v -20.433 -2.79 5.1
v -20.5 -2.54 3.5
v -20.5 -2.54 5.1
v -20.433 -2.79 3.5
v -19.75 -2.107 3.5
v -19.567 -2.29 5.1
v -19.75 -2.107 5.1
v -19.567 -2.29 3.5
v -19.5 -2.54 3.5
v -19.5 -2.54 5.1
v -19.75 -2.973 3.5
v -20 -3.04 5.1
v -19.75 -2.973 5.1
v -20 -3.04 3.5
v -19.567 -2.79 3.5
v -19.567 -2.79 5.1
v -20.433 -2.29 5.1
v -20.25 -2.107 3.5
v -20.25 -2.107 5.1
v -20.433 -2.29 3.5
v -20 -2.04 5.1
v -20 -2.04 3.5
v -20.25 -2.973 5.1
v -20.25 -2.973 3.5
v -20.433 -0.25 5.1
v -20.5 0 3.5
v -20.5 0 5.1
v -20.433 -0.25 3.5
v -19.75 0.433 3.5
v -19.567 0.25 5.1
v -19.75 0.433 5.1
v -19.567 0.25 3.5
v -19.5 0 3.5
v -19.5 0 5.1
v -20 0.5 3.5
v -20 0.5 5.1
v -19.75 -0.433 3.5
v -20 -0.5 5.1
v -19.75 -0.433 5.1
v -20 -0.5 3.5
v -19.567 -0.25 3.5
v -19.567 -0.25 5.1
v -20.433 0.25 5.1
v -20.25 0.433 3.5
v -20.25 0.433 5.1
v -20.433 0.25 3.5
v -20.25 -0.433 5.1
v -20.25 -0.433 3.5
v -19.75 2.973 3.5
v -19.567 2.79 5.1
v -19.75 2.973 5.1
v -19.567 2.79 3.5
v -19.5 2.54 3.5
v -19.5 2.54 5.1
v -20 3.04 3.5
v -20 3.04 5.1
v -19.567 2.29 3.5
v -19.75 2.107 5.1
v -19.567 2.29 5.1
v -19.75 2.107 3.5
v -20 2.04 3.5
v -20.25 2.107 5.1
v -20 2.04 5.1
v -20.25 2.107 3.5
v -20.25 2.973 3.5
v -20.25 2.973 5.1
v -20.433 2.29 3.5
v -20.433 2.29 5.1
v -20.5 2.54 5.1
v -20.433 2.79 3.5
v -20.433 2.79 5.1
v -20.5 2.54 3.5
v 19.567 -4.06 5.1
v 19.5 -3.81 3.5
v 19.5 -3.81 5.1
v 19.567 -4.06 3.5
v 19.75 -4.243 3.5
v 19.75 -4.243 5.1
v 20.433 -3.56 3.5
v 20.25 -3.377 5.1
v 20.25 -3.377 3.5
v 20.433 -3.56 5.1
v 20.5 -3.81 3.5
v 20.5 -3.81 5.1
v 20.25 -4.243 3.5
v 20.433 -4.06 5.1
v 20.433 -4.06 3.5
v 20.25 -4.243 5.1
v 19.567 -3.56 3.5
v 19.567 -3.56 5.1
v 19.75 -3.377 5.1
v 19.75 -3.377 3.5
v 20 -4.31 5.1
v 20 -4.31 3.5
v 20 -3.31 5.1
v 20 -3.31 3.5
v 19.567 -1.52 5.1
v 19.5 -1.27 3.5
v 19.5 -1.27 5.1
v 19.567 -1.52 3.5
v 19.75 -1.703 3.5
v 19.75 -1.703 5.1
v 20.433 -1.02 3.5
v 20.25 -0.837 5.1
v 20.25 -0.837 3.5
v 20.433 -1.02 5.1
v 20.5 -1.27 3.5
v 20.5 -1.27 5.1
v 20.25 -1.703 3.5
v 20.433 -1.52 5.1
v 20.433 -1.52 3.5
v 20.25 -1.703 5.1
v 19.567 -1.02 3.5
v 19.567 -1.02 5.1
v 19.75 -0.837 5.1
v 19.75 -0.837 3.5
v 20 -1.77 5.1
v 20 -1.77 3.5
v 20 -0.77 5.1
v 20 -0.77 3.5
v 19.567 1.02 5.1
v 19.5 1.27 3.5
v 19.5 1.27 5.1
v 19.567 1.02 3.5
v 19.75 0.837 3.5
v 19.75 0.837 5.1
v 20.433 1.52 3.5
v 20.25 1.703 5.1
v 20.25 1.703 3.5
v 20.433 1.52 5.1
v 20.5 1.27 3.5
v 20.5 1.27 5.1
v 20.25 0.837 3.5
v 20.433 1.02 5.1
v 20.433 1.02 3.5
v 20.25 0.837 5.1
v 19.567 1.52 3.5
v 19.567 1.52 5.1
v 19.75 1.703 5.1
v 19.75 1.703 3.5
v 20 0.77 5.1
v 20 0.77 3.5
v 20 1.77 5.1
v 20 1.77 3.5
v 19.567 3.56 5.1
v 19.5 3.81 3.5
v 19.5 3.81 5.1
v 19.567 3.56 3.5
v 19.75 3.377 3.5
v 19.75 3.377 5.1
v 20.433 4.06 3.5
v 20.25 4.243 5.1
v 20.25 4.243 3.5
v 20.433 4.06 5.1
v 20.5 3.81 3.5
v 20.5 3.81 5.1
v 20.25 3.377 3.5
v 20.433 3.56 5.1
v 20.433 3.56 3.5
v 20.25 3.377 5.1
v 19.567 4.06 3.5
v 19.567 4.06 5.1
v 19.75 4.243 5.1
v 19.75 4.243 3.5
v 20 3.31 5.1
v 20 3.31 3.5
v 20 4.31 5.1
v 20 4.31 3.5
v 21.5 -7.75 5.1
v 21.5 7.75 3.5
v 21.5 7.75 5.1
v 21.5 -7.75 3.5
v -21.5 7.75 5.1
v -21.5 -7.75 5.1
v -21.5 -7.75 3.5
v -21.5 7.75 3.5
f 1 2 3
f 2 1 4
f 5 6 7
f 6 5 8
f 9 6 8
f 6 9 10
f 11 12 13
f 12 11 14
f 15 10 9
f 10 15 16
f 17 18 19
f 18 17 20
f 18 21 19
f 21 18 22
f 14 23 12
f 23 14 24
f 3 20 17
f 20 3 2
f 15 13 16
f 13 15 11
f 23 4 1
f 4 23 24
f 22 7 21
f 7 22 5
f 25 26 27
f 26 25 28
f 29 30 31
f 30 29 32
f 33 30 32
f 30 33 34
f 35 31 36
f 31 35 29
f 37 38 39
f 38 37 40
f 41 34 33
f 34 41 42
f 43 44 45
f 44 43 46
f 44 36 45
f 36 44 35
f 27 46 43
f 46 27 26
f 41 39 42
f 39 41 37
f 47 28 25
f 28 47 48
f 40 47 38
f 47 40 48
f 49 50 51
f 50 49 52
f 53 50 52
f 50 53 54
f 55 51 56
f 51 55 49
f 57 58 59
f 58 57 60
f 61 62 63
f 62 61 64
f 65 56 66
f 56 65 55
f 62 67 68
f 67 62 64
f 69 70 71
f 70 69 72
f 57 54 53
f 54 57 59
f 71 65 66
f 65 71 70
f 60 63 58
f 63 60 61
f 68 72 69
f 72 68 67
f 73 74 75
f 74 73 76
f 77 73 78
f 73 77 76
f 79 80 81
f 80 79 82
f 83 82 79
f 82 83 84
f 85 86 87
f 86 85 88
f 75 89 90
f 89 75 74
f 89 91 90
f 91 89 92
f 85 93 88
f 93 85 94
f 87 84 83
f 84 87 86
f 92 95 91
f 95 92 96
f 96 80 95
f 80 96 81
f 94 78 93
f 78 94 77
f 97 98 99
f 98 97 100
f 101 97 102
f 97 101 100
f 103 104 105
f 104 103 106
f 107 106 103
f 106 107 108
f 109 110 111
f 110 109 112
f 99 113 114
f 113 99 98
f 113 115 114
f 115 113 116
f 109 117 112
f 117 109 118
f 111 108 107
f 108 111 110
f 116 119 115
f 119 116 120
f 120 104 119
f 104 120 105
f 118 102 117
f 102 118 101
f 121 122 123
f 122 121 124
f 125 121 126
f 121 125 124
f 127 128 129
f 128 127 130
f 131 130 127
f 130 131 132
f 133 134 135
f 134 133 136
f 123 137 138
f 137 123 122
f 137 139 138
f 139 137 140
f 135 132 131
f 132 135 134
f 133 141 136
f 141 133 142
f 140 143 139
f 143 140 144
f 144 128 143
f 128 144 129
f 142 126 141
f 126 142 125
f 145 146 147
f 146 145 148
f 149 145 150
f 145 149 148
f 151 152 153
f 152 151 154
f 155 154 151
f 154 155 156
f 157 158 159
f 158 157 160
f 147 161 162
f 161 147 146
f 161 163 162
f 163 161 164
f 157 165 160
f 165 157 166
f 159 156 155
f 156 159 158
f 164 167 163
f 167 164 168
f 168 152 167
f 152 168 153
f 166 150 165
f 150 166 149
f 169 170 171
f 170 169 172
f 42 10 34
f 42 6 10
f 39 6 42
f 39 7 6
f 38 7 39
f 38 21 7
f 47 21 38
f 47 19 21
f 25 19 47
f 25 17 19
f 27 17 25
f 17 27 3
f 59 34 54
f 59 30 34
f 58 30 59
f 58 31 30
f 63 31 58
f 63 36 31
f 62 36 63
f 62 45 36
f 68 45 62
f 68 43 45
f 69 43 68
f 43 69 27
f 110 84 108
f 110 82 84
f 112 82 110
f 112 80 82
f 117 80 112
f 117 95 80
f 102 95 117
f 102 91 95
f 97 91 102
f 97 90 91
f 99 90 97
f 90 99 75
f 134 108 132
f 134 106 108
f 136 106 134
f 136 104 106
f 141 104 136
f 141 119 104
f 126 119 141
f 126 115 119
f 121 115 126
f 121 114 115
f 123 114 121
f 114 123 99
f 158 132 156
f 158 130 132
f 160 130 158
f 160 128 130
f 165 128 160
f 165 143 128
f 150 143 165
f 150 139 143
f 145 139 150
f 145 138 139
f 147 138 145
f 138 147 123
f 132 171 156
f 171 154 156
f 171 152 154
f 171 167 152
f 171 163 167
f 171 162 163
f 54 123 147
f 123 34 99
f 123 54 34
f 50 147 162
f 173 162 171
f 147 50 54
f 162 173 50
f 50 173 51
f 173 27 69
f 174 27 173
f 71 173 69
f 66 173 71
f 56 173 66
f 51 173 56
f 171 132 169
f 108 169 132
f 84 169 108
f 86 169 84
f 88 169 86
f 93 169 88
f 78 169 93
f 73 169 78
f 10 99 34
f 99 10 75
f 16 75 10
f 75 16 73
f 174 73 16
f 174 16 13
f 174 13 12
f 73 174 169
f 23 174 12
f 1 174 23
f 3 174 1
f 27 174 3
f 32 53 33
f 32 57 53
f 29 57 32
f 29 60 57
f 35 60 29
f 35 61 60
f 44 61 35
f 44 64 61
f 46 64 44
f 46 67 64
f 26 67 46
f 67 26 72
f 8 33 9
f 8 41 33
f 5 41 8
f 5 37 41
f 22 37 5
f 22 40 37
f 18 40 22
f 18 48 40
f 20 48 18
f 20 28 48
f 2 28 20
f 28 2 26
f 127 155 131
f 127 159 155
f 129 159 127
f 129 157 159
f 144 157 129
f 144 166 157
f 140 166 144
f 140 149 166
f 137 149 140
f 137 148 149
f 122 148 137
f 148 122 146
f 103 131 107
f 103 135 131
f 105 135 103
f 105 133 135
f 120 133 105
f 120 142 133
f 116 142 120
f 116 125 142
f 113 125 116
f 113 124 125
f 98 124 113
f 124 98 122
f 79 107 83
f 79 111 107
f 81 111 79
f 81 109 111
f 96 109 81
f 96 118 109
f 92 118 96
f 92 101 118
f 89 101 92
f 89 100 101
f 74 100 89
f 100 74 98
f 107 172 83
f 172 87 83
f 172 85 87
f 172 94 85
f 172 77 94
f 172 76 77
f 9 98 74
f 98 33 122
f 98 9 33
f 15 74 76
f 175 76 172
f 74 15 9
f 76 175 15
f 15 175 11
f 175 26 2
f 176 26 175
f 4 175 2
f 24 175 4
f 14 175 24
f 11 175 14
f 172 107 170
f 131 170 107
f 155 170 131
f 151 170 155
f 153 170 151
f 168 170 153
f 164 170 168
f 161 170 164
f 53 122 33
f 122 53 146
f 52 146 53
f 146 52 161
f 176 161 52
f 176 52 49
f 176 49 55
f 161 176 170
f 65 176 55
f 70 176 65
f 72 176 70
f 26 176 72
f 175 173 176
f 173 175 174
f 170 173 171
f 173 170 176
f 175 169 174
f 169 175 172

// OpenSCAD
// file: ../../screw-post/screw-post.scad
//-----------------------------------------------------------------------
// Screw post: a round post off the floor that a board screws down onto
//
// Two ways to fix:
//   "nut"  clearance hole through the post and floor; the nut sits in a hex
//          trap in the floor's underside, so the screw goes in from the top
//   "tap"  a pilot hole the screw cuts its own thread in (one or two fittings
//          in PLA/PETG); blind, the floor stays whole underneath
// and "head" for a screw up from below (head in a counterbore, nut on top).
//
// Modules, all in the same frame:
//   screwPostGhost()     the screw (and nut), for previews
//   screwPost()          the post: add to the floor
//   screwPostFloorCut()  subtract from the floor: nut trap / counterbore and hole
//
// Frame: origin on the floor top, on the post's axis. Z up; the floor is
// Z = -floorThick .. 0. Units: mm.
//
// Sizes: "M2", "M2.5", "M3". screwPostScrew(size, ...) says which screw length
// reaches, so a project can assert it has that screw in the kit.
//-----------------------------------------------------------------------

//-- [name, screw Ø, nut across flats, nut thick, head Ø, head height, tap hole, post Ø]
//-- Nuts ISO 4032; heads ISO 7380 button. Tap holes: the usual ~0.8 x Ø for plastic
screwSizes = [
  ["M2",   2.0, 4.0, 1.6, 3.5, 1.1, 1.6, 5.0],
  ["M2.5", 2.5, 5.0, 2.0, 4.4, 1.4, 2.1, 6.0],    // head 4.4: measured on the kit's M2.5 (controller base)
  ["M3",   3.0, 5.5, 2.4, 5.7, 1.65, 2.5, 7.0],
];

screwHoleClear = 0.4;     // added to the screw Ø for a clearance hole
screwNutClear  = 0.3;     // CAL: across flats, nut trap over the nut. Set by the fit piece
screwTapClear  = 0.0;     // CAL: added to the tap hole. Set by the fit piece
screwHeadClear = 0.6;     // counterbore over the head Ø

function screwSize(size) = let (i = search([size], screwSizes)[0])
  assert(i != [] && i != undef, str("unknown screw size ", size)) screwSizes[i];
function screwDia(size)    = screwSize(size)[1];
function screwNutAF(size)  = screwSize(size)[2];
function screwNutH(size)   = screwSize(size)[3];
function screwHeadDia(size)= screwSize(size)[4];
function screwHeadH(size)  = screwSize(size)[5];
function screwPostDia(size)= screwSize(size)[7];

//-- Shortest screw that fills the nut, from the top of the clamped part (h + clamp
//-- above the floor) down to the nut trap's underside. Round up to a length you have.
function screwPostScrew(size, h, floorThick, clamp = 1.6) = h + clamp + floorThick;

module screwPostGhost(size, h, floorThick, clamp = 1.6, length, how = "nut")
{
  d = screwDia(size);
  L = is_undef(length) ? screwPostScrew(size, h, floorThick, clamp) : length;
  top = h + clamp;
  if (how == "head")
  {
    %color("Silver") translate([0, 0, -floorThick]) cylinder(d = screwHeadDia(size), h = screwHeadH(size), $fn = 24);
    %color("Silver") translate([0, 0, -floorThick + screwHeadH(size)]) cylinder(d = d, h = L, $fn = 16);
  }
  else
  {
    %color("Silver") translate([0, 0, top]) cylinder(d = screwHeadDia(size), h = screwHeadH(size), $fn = 24);
    %color("Silver") translate([0, 0, top - L]) cylinder(d = d, h = L, $fn = 16);
    if (how == "nut")
      %color("DimGray") translate([0, 0, -floorThick]) rotate([0, 0, 30]) cylinder(d = screwNutAF(size)/cos(30), h = screwNutH(size), $fn = 6);
  }
}

//-- how: "nut" | "head" (through hole) or "tap" (blind pilot hole). postDia defaults by size
module screwPost(size, h, how = "nut", postDia, tapClear = screwTapClear)
{
  pd = is_undef(postDia) ? screwPostDia(size) : postDia;
  hole = how == "tap" ? screwSize(size)[6] + tapClear : screwDia(size) + screwHoleClear;
  difference()
  {
    translate([0, 0, -0.01]) cylinder(d = pd, h = h + 0.01, $fn = 40);
    translate([0, 0, how == "tap" ? 0.6 : -1]) cylinder(d = hole, h = h + 2, $fn = 24);
    //-- lead-in so the screw starts square
    translate([0, 0, h - 0.4]) cylinder(d1 = hole, d2 = hole + 0.8, h = 0.41, $fn = 24);
  }
}

//-- "nut": hex trap from the underside, opening a little over the nut so it sits flush.
//-- "head": counterbore for the head. "tap": nothing.
module screwPostFloorCut(size, floorThick, how = "nut", nutClear = screwNutClear)
{
  d = screwDia(size) + screwHoleClear;
  if (how == "nut")
  {
    af = screwNutAF(size) + nutClear;
    translate([0, 0, -floorThick - 1]) rotate([0, 0, 30]) cylinder(d = af/cos(30), h = screwNutH(size) + 0.1 + 1, $fn = 6);
    translate([0, 0, -floorThick - 1]) cylinder(d = d + 0.4, h = floorThick + 2, $fn = 24);
  }
  if (how == "head")
  {
    translate([0, 0, -floorThick - 1]) cylinder(d = screwHeadDia(size) + screwHeadClear, h = screwHeadH(size) + 0.2 + 1, $fn = 32);
    translate([0, 0, -floorThick - 1]) cylinder(d = d + 0.4, h = floorThick + 2, $fn = 24);
  }
  assert(how == "tap" || floorThick >= (how == "nut" ? screwNutH(size) : screwHeadH(size)) + 0.1 + 0.3,
         str("floor too thin for the ", size, " ", how));
}
// file: ../../board-pocket/board-pocket.scad
//-----------------------------------------------------------------------
// Board pocket: holds a board that has no mounting holes
//
// The board sits on a central pedestal with a pad of double-sided foam tape
// on top, inside a low wall that follows its outline. The pedestal keeps
// the board's edges off the floor, so lead stubs soldered through the edge
// holes have room underneath; gaps in the wall let the leads out. The wall
// only locates the board: the tape holds it down, and in a closed box a lid
// pad presses a pad of foam onto it (boardLidPad below).
//
// Modules, all in the same frame:
//   boardPocketGhost()   the board and its tape, for previews
//   boardPocketHolder()  the plastic: pedestal and outline wall, add to the floor
//   boardLidPad()        a block hanging from the lid that presses foam onto the board
//   boardLidPadGhost()   the foam under it, squashed, for previews
//
// Frame: origin on the floor top, under the centre of the board's outline.
// X along the board's length l, Y across its width w, Z up. Units: mm.
//
// Sides are listed [-X, +X, -Y, +Y], each one of
//   "gap"    wall with a gap in the middle for leads (gapW wide)
//   "solid"  whole wall: use it where the board takes a push (a plug)
//   "open"   no wall: the board's edge goes into a box wall (a USB port)
//
// Used by esp32-c3-supermini, esp32-s3-devkitc and rs485-max485.
//-----------------------------------------------------------------------

//-- From the controller project's receiver.scad / rack-end.scad (boardPocket), 2026-10-30
bpPedestal  = 2.5;     // floor to the tape: room for lead stubs under the board edges
bpTape      = 1.0;     // double-sided foam tape on the pedestal. CAL: how far it squashes
bpWall      = 1.2;     // outline wall thickness
bpRise      = 1.0;     // wall top above the PCB underside (the controller project's rack-end: 0.8 under the S3's module)
bpClearance = 0.4;     // per side, board outline to wall: PETG. 0.3 for PLA. Set by the fit piece
bpGapW      = 6;       // lead gap in a "gap" side
bpPadInset  = 4;       // default pedestal: the board less this all round

//-- Lid hold-down (the controller project's receiver / rack-end lid pads)
bpFoam      = 3.0;     // CAL: self-adhesive foam stuck under each lid pad
bpSqueeze   = 1.0;     // how far the lid squashes it: ~1/3 for soft foam, 0.3 for felt

//-- PCB underside above the floor top
function boardPocketZ(pedestal = bpPedestal, tape = bpTape) = pedestal + tape;
//-- default pedestal [l, w] for a board
function boardPocketPad(l, w, inset = bpPadInset) = [max(l - 2*inset, 4), max(w - 2*inset, 4)];
//-- Z of a lid pad's underside, pressing on a surface at surfaceZ (board top, or a part on it)
function boardLidPadZ(surfaceZ, foam = bpFoam, squeeze = bpSqueeze) =
  assert(squeeze > 0 && squeeze < foam, "foam would not touch the board")
  surfaceZ + foam - squeeze;

function bpSides4(s) = is_list(s) ? s : [s, s, s, s];

module boardPocketGhost(l, w, pcb = 1.6, pad, pedestal = bpPedestal, tape = bpTape)
{
  p = is_undef(pad) ? boardPocketPad(l, w) : pad;
  %color("White") translate([-p[0]/2, -p[1]/2, pedestal]) cube([p[0], p[1], tape]);
  %color("DarkGreen") translate([-l/2, -w/2, pedestal + tape]) cube([l, w, pcb]);
}

//-- pad: pedestal [l, w]; gapW a number or one per side
module boardPocketHolder(l, w, pad, sides = "gap", gapW = bpGapW, clearance = bpClearance,
                         pedestal = bpPedestal, tape = bpTape, wall = bpWall, rise = bpRise)
{
  p   = is_undef(pad) ? boardPocketPad(l, w) : pad;
  s   = bpSides4(sides);
  g   = bpSides4(gapW);
  ix  = l/2 + clearance;                 // inner half sizes
  iy  = w/2 + clearance;
  top = pedestal + tape + rise;
  assert(p[0] <= l && p[1] <= w, "pedestal bigger than the board");
  for (k = s) assert(k == "gap" || k == "solid" || k == "open", str("unknown side ", k));

  //-- pedestal, centred under the board
  translate([-p[0]/2, -p[1]/2, -0.01]) cube([p[0], p[1], pedestal + 0.01]);
  //-- outline wall
  difference()
  {
    translate([-ix - wall, -iy - wall, -0.01]) cube([2*(ix + wall), 2*(iy + wall), top + 0.01]);
    translate([-ix, -iy, -1]) cube([2*ix, 2*iy, top + 2]);
    for (i = [0 : 3])
    {
      //-- each side's cut, drawn for -X then turned into place
      ax = (i < 2) ? ix : iy;         // inner half size across the side
      al = (i < 2) ? iy : ix;         // half length along it
      rotate([0, 0, [0, 180, 90, 270][i]])   // -X, +X, -Y, +Y
      {
        if (s[i] == "gap")
          translate([-ax - wall - 1, -g[i]/2, -1]) cube([wall + 2, g[i], top + 2]);
        if (s[i] == "open")
          translate([-ax - wall - 1, -al - wall - 1, -1]) cube([wall + 1.01, 2*(al + wall + 1), top + 2]);
      }
    }
  }
}

//-- A lid pad over the rectangle size [x, y] centred at `at`, from the squashed foam up to
//-- lidZ (the lid's inner face in this frame), running `into` up into the lid plate
module boardLidPad(size, at = [0, 0], surfaceZ, lidZ, foam = bpFoam, squeeze = bpSqueeze, into = 0.5)
{
  z0 = boardLidPadZ(surfaceZ, foam, squeeze);
  assert(lidZ > z0, "lid is below the pad: the box is too low for the foam");
  translate([at[0] - size[0]/2, at[1] - size[1]/2, z0]) cube([size[0], size[1], lidZ - z0 + into]);
}

module boardLidPadGhost(size, at = [0, 0], surfaceZ, foam = bpFoam, squeeze = bpSqueeze)
{
  %color("Gray") translate([at[0] - size[0]/2, at[1] - size[1]/2, surfaceZ]) cube([size[0], size[1], foam - squeeze]);
}
// main file
// The board as solids, for the catalogue (the Ghost is % so it never renders).
// part = "board" | "chips" | "foam" (squashed, under the lid pads); n boards at the fit piece's pitch.
// tape = 0 seats it as on a carrier (no tape under the board).
include <../rs485-max485.scad>

variant = "jzk";
part    = "board";
n       = 1;
pitch   = 30;
squeezes = [0.5, 1.0, 1.5, 2.0];   // as fit.scad (n > 1)
tape    = bpTape;

v   = rs485(variant);
top = rs485Top(variant, bpPedestal, tape);
module one(sq)
{
  if (part == "board") difference()
  {
    translate([-v[1]/2, -v[2]/2, top - v[3]]) cube([v[1], v[2], v[3]]);
    for (e = [[-1, v[5]], [1, v[6]]], i = [0 : e[1] - 1])
      translate([e[0]*(v[1]/2 - rs485PinEnd), (i - (e[1] - 1)/2)*rs485PinPitch, top - v[3] - 1])
        cylinder(d = 1.0, h = v[3] + 2, $fn = 12);
  }
  if (part == "chips")
  {
    for (x = [-1, 1]) translate([x*5 - rs485ChipSize[0]/2, -rs485ChipSize[1]/2, top - 0.01]) cube(rs485ChipSize + [0, 0, 0.01]);
    if (!is_undef(v[7])) translate([-v[1]/2 + 3, -v[7][1]/2, top - 0.01]) cube(v[7]);
  }
  if (part == "foam")
  {
    xs = n == 1 ? [-v[1]/2 + rs485PadInset + rs485PadLen/2, v[1]/2 - rs485PadInset - rs485PadLen/2]
                : [v[1]/2 - rs485PadInset - rs485PadLen/2];
    for (x = xs) translate([x - rs485PadLen/2, -(v[2] - 3)/2, top]) cube([rs485PadLen, v[2] - 3, bpFoam - sq - 0.01]);
  }
}
if (n == 1) one(bpSqueeze);
else for (i = [0 : n - 1]) translate([0, i*pitch, 0]) one(squeezes[i]);
